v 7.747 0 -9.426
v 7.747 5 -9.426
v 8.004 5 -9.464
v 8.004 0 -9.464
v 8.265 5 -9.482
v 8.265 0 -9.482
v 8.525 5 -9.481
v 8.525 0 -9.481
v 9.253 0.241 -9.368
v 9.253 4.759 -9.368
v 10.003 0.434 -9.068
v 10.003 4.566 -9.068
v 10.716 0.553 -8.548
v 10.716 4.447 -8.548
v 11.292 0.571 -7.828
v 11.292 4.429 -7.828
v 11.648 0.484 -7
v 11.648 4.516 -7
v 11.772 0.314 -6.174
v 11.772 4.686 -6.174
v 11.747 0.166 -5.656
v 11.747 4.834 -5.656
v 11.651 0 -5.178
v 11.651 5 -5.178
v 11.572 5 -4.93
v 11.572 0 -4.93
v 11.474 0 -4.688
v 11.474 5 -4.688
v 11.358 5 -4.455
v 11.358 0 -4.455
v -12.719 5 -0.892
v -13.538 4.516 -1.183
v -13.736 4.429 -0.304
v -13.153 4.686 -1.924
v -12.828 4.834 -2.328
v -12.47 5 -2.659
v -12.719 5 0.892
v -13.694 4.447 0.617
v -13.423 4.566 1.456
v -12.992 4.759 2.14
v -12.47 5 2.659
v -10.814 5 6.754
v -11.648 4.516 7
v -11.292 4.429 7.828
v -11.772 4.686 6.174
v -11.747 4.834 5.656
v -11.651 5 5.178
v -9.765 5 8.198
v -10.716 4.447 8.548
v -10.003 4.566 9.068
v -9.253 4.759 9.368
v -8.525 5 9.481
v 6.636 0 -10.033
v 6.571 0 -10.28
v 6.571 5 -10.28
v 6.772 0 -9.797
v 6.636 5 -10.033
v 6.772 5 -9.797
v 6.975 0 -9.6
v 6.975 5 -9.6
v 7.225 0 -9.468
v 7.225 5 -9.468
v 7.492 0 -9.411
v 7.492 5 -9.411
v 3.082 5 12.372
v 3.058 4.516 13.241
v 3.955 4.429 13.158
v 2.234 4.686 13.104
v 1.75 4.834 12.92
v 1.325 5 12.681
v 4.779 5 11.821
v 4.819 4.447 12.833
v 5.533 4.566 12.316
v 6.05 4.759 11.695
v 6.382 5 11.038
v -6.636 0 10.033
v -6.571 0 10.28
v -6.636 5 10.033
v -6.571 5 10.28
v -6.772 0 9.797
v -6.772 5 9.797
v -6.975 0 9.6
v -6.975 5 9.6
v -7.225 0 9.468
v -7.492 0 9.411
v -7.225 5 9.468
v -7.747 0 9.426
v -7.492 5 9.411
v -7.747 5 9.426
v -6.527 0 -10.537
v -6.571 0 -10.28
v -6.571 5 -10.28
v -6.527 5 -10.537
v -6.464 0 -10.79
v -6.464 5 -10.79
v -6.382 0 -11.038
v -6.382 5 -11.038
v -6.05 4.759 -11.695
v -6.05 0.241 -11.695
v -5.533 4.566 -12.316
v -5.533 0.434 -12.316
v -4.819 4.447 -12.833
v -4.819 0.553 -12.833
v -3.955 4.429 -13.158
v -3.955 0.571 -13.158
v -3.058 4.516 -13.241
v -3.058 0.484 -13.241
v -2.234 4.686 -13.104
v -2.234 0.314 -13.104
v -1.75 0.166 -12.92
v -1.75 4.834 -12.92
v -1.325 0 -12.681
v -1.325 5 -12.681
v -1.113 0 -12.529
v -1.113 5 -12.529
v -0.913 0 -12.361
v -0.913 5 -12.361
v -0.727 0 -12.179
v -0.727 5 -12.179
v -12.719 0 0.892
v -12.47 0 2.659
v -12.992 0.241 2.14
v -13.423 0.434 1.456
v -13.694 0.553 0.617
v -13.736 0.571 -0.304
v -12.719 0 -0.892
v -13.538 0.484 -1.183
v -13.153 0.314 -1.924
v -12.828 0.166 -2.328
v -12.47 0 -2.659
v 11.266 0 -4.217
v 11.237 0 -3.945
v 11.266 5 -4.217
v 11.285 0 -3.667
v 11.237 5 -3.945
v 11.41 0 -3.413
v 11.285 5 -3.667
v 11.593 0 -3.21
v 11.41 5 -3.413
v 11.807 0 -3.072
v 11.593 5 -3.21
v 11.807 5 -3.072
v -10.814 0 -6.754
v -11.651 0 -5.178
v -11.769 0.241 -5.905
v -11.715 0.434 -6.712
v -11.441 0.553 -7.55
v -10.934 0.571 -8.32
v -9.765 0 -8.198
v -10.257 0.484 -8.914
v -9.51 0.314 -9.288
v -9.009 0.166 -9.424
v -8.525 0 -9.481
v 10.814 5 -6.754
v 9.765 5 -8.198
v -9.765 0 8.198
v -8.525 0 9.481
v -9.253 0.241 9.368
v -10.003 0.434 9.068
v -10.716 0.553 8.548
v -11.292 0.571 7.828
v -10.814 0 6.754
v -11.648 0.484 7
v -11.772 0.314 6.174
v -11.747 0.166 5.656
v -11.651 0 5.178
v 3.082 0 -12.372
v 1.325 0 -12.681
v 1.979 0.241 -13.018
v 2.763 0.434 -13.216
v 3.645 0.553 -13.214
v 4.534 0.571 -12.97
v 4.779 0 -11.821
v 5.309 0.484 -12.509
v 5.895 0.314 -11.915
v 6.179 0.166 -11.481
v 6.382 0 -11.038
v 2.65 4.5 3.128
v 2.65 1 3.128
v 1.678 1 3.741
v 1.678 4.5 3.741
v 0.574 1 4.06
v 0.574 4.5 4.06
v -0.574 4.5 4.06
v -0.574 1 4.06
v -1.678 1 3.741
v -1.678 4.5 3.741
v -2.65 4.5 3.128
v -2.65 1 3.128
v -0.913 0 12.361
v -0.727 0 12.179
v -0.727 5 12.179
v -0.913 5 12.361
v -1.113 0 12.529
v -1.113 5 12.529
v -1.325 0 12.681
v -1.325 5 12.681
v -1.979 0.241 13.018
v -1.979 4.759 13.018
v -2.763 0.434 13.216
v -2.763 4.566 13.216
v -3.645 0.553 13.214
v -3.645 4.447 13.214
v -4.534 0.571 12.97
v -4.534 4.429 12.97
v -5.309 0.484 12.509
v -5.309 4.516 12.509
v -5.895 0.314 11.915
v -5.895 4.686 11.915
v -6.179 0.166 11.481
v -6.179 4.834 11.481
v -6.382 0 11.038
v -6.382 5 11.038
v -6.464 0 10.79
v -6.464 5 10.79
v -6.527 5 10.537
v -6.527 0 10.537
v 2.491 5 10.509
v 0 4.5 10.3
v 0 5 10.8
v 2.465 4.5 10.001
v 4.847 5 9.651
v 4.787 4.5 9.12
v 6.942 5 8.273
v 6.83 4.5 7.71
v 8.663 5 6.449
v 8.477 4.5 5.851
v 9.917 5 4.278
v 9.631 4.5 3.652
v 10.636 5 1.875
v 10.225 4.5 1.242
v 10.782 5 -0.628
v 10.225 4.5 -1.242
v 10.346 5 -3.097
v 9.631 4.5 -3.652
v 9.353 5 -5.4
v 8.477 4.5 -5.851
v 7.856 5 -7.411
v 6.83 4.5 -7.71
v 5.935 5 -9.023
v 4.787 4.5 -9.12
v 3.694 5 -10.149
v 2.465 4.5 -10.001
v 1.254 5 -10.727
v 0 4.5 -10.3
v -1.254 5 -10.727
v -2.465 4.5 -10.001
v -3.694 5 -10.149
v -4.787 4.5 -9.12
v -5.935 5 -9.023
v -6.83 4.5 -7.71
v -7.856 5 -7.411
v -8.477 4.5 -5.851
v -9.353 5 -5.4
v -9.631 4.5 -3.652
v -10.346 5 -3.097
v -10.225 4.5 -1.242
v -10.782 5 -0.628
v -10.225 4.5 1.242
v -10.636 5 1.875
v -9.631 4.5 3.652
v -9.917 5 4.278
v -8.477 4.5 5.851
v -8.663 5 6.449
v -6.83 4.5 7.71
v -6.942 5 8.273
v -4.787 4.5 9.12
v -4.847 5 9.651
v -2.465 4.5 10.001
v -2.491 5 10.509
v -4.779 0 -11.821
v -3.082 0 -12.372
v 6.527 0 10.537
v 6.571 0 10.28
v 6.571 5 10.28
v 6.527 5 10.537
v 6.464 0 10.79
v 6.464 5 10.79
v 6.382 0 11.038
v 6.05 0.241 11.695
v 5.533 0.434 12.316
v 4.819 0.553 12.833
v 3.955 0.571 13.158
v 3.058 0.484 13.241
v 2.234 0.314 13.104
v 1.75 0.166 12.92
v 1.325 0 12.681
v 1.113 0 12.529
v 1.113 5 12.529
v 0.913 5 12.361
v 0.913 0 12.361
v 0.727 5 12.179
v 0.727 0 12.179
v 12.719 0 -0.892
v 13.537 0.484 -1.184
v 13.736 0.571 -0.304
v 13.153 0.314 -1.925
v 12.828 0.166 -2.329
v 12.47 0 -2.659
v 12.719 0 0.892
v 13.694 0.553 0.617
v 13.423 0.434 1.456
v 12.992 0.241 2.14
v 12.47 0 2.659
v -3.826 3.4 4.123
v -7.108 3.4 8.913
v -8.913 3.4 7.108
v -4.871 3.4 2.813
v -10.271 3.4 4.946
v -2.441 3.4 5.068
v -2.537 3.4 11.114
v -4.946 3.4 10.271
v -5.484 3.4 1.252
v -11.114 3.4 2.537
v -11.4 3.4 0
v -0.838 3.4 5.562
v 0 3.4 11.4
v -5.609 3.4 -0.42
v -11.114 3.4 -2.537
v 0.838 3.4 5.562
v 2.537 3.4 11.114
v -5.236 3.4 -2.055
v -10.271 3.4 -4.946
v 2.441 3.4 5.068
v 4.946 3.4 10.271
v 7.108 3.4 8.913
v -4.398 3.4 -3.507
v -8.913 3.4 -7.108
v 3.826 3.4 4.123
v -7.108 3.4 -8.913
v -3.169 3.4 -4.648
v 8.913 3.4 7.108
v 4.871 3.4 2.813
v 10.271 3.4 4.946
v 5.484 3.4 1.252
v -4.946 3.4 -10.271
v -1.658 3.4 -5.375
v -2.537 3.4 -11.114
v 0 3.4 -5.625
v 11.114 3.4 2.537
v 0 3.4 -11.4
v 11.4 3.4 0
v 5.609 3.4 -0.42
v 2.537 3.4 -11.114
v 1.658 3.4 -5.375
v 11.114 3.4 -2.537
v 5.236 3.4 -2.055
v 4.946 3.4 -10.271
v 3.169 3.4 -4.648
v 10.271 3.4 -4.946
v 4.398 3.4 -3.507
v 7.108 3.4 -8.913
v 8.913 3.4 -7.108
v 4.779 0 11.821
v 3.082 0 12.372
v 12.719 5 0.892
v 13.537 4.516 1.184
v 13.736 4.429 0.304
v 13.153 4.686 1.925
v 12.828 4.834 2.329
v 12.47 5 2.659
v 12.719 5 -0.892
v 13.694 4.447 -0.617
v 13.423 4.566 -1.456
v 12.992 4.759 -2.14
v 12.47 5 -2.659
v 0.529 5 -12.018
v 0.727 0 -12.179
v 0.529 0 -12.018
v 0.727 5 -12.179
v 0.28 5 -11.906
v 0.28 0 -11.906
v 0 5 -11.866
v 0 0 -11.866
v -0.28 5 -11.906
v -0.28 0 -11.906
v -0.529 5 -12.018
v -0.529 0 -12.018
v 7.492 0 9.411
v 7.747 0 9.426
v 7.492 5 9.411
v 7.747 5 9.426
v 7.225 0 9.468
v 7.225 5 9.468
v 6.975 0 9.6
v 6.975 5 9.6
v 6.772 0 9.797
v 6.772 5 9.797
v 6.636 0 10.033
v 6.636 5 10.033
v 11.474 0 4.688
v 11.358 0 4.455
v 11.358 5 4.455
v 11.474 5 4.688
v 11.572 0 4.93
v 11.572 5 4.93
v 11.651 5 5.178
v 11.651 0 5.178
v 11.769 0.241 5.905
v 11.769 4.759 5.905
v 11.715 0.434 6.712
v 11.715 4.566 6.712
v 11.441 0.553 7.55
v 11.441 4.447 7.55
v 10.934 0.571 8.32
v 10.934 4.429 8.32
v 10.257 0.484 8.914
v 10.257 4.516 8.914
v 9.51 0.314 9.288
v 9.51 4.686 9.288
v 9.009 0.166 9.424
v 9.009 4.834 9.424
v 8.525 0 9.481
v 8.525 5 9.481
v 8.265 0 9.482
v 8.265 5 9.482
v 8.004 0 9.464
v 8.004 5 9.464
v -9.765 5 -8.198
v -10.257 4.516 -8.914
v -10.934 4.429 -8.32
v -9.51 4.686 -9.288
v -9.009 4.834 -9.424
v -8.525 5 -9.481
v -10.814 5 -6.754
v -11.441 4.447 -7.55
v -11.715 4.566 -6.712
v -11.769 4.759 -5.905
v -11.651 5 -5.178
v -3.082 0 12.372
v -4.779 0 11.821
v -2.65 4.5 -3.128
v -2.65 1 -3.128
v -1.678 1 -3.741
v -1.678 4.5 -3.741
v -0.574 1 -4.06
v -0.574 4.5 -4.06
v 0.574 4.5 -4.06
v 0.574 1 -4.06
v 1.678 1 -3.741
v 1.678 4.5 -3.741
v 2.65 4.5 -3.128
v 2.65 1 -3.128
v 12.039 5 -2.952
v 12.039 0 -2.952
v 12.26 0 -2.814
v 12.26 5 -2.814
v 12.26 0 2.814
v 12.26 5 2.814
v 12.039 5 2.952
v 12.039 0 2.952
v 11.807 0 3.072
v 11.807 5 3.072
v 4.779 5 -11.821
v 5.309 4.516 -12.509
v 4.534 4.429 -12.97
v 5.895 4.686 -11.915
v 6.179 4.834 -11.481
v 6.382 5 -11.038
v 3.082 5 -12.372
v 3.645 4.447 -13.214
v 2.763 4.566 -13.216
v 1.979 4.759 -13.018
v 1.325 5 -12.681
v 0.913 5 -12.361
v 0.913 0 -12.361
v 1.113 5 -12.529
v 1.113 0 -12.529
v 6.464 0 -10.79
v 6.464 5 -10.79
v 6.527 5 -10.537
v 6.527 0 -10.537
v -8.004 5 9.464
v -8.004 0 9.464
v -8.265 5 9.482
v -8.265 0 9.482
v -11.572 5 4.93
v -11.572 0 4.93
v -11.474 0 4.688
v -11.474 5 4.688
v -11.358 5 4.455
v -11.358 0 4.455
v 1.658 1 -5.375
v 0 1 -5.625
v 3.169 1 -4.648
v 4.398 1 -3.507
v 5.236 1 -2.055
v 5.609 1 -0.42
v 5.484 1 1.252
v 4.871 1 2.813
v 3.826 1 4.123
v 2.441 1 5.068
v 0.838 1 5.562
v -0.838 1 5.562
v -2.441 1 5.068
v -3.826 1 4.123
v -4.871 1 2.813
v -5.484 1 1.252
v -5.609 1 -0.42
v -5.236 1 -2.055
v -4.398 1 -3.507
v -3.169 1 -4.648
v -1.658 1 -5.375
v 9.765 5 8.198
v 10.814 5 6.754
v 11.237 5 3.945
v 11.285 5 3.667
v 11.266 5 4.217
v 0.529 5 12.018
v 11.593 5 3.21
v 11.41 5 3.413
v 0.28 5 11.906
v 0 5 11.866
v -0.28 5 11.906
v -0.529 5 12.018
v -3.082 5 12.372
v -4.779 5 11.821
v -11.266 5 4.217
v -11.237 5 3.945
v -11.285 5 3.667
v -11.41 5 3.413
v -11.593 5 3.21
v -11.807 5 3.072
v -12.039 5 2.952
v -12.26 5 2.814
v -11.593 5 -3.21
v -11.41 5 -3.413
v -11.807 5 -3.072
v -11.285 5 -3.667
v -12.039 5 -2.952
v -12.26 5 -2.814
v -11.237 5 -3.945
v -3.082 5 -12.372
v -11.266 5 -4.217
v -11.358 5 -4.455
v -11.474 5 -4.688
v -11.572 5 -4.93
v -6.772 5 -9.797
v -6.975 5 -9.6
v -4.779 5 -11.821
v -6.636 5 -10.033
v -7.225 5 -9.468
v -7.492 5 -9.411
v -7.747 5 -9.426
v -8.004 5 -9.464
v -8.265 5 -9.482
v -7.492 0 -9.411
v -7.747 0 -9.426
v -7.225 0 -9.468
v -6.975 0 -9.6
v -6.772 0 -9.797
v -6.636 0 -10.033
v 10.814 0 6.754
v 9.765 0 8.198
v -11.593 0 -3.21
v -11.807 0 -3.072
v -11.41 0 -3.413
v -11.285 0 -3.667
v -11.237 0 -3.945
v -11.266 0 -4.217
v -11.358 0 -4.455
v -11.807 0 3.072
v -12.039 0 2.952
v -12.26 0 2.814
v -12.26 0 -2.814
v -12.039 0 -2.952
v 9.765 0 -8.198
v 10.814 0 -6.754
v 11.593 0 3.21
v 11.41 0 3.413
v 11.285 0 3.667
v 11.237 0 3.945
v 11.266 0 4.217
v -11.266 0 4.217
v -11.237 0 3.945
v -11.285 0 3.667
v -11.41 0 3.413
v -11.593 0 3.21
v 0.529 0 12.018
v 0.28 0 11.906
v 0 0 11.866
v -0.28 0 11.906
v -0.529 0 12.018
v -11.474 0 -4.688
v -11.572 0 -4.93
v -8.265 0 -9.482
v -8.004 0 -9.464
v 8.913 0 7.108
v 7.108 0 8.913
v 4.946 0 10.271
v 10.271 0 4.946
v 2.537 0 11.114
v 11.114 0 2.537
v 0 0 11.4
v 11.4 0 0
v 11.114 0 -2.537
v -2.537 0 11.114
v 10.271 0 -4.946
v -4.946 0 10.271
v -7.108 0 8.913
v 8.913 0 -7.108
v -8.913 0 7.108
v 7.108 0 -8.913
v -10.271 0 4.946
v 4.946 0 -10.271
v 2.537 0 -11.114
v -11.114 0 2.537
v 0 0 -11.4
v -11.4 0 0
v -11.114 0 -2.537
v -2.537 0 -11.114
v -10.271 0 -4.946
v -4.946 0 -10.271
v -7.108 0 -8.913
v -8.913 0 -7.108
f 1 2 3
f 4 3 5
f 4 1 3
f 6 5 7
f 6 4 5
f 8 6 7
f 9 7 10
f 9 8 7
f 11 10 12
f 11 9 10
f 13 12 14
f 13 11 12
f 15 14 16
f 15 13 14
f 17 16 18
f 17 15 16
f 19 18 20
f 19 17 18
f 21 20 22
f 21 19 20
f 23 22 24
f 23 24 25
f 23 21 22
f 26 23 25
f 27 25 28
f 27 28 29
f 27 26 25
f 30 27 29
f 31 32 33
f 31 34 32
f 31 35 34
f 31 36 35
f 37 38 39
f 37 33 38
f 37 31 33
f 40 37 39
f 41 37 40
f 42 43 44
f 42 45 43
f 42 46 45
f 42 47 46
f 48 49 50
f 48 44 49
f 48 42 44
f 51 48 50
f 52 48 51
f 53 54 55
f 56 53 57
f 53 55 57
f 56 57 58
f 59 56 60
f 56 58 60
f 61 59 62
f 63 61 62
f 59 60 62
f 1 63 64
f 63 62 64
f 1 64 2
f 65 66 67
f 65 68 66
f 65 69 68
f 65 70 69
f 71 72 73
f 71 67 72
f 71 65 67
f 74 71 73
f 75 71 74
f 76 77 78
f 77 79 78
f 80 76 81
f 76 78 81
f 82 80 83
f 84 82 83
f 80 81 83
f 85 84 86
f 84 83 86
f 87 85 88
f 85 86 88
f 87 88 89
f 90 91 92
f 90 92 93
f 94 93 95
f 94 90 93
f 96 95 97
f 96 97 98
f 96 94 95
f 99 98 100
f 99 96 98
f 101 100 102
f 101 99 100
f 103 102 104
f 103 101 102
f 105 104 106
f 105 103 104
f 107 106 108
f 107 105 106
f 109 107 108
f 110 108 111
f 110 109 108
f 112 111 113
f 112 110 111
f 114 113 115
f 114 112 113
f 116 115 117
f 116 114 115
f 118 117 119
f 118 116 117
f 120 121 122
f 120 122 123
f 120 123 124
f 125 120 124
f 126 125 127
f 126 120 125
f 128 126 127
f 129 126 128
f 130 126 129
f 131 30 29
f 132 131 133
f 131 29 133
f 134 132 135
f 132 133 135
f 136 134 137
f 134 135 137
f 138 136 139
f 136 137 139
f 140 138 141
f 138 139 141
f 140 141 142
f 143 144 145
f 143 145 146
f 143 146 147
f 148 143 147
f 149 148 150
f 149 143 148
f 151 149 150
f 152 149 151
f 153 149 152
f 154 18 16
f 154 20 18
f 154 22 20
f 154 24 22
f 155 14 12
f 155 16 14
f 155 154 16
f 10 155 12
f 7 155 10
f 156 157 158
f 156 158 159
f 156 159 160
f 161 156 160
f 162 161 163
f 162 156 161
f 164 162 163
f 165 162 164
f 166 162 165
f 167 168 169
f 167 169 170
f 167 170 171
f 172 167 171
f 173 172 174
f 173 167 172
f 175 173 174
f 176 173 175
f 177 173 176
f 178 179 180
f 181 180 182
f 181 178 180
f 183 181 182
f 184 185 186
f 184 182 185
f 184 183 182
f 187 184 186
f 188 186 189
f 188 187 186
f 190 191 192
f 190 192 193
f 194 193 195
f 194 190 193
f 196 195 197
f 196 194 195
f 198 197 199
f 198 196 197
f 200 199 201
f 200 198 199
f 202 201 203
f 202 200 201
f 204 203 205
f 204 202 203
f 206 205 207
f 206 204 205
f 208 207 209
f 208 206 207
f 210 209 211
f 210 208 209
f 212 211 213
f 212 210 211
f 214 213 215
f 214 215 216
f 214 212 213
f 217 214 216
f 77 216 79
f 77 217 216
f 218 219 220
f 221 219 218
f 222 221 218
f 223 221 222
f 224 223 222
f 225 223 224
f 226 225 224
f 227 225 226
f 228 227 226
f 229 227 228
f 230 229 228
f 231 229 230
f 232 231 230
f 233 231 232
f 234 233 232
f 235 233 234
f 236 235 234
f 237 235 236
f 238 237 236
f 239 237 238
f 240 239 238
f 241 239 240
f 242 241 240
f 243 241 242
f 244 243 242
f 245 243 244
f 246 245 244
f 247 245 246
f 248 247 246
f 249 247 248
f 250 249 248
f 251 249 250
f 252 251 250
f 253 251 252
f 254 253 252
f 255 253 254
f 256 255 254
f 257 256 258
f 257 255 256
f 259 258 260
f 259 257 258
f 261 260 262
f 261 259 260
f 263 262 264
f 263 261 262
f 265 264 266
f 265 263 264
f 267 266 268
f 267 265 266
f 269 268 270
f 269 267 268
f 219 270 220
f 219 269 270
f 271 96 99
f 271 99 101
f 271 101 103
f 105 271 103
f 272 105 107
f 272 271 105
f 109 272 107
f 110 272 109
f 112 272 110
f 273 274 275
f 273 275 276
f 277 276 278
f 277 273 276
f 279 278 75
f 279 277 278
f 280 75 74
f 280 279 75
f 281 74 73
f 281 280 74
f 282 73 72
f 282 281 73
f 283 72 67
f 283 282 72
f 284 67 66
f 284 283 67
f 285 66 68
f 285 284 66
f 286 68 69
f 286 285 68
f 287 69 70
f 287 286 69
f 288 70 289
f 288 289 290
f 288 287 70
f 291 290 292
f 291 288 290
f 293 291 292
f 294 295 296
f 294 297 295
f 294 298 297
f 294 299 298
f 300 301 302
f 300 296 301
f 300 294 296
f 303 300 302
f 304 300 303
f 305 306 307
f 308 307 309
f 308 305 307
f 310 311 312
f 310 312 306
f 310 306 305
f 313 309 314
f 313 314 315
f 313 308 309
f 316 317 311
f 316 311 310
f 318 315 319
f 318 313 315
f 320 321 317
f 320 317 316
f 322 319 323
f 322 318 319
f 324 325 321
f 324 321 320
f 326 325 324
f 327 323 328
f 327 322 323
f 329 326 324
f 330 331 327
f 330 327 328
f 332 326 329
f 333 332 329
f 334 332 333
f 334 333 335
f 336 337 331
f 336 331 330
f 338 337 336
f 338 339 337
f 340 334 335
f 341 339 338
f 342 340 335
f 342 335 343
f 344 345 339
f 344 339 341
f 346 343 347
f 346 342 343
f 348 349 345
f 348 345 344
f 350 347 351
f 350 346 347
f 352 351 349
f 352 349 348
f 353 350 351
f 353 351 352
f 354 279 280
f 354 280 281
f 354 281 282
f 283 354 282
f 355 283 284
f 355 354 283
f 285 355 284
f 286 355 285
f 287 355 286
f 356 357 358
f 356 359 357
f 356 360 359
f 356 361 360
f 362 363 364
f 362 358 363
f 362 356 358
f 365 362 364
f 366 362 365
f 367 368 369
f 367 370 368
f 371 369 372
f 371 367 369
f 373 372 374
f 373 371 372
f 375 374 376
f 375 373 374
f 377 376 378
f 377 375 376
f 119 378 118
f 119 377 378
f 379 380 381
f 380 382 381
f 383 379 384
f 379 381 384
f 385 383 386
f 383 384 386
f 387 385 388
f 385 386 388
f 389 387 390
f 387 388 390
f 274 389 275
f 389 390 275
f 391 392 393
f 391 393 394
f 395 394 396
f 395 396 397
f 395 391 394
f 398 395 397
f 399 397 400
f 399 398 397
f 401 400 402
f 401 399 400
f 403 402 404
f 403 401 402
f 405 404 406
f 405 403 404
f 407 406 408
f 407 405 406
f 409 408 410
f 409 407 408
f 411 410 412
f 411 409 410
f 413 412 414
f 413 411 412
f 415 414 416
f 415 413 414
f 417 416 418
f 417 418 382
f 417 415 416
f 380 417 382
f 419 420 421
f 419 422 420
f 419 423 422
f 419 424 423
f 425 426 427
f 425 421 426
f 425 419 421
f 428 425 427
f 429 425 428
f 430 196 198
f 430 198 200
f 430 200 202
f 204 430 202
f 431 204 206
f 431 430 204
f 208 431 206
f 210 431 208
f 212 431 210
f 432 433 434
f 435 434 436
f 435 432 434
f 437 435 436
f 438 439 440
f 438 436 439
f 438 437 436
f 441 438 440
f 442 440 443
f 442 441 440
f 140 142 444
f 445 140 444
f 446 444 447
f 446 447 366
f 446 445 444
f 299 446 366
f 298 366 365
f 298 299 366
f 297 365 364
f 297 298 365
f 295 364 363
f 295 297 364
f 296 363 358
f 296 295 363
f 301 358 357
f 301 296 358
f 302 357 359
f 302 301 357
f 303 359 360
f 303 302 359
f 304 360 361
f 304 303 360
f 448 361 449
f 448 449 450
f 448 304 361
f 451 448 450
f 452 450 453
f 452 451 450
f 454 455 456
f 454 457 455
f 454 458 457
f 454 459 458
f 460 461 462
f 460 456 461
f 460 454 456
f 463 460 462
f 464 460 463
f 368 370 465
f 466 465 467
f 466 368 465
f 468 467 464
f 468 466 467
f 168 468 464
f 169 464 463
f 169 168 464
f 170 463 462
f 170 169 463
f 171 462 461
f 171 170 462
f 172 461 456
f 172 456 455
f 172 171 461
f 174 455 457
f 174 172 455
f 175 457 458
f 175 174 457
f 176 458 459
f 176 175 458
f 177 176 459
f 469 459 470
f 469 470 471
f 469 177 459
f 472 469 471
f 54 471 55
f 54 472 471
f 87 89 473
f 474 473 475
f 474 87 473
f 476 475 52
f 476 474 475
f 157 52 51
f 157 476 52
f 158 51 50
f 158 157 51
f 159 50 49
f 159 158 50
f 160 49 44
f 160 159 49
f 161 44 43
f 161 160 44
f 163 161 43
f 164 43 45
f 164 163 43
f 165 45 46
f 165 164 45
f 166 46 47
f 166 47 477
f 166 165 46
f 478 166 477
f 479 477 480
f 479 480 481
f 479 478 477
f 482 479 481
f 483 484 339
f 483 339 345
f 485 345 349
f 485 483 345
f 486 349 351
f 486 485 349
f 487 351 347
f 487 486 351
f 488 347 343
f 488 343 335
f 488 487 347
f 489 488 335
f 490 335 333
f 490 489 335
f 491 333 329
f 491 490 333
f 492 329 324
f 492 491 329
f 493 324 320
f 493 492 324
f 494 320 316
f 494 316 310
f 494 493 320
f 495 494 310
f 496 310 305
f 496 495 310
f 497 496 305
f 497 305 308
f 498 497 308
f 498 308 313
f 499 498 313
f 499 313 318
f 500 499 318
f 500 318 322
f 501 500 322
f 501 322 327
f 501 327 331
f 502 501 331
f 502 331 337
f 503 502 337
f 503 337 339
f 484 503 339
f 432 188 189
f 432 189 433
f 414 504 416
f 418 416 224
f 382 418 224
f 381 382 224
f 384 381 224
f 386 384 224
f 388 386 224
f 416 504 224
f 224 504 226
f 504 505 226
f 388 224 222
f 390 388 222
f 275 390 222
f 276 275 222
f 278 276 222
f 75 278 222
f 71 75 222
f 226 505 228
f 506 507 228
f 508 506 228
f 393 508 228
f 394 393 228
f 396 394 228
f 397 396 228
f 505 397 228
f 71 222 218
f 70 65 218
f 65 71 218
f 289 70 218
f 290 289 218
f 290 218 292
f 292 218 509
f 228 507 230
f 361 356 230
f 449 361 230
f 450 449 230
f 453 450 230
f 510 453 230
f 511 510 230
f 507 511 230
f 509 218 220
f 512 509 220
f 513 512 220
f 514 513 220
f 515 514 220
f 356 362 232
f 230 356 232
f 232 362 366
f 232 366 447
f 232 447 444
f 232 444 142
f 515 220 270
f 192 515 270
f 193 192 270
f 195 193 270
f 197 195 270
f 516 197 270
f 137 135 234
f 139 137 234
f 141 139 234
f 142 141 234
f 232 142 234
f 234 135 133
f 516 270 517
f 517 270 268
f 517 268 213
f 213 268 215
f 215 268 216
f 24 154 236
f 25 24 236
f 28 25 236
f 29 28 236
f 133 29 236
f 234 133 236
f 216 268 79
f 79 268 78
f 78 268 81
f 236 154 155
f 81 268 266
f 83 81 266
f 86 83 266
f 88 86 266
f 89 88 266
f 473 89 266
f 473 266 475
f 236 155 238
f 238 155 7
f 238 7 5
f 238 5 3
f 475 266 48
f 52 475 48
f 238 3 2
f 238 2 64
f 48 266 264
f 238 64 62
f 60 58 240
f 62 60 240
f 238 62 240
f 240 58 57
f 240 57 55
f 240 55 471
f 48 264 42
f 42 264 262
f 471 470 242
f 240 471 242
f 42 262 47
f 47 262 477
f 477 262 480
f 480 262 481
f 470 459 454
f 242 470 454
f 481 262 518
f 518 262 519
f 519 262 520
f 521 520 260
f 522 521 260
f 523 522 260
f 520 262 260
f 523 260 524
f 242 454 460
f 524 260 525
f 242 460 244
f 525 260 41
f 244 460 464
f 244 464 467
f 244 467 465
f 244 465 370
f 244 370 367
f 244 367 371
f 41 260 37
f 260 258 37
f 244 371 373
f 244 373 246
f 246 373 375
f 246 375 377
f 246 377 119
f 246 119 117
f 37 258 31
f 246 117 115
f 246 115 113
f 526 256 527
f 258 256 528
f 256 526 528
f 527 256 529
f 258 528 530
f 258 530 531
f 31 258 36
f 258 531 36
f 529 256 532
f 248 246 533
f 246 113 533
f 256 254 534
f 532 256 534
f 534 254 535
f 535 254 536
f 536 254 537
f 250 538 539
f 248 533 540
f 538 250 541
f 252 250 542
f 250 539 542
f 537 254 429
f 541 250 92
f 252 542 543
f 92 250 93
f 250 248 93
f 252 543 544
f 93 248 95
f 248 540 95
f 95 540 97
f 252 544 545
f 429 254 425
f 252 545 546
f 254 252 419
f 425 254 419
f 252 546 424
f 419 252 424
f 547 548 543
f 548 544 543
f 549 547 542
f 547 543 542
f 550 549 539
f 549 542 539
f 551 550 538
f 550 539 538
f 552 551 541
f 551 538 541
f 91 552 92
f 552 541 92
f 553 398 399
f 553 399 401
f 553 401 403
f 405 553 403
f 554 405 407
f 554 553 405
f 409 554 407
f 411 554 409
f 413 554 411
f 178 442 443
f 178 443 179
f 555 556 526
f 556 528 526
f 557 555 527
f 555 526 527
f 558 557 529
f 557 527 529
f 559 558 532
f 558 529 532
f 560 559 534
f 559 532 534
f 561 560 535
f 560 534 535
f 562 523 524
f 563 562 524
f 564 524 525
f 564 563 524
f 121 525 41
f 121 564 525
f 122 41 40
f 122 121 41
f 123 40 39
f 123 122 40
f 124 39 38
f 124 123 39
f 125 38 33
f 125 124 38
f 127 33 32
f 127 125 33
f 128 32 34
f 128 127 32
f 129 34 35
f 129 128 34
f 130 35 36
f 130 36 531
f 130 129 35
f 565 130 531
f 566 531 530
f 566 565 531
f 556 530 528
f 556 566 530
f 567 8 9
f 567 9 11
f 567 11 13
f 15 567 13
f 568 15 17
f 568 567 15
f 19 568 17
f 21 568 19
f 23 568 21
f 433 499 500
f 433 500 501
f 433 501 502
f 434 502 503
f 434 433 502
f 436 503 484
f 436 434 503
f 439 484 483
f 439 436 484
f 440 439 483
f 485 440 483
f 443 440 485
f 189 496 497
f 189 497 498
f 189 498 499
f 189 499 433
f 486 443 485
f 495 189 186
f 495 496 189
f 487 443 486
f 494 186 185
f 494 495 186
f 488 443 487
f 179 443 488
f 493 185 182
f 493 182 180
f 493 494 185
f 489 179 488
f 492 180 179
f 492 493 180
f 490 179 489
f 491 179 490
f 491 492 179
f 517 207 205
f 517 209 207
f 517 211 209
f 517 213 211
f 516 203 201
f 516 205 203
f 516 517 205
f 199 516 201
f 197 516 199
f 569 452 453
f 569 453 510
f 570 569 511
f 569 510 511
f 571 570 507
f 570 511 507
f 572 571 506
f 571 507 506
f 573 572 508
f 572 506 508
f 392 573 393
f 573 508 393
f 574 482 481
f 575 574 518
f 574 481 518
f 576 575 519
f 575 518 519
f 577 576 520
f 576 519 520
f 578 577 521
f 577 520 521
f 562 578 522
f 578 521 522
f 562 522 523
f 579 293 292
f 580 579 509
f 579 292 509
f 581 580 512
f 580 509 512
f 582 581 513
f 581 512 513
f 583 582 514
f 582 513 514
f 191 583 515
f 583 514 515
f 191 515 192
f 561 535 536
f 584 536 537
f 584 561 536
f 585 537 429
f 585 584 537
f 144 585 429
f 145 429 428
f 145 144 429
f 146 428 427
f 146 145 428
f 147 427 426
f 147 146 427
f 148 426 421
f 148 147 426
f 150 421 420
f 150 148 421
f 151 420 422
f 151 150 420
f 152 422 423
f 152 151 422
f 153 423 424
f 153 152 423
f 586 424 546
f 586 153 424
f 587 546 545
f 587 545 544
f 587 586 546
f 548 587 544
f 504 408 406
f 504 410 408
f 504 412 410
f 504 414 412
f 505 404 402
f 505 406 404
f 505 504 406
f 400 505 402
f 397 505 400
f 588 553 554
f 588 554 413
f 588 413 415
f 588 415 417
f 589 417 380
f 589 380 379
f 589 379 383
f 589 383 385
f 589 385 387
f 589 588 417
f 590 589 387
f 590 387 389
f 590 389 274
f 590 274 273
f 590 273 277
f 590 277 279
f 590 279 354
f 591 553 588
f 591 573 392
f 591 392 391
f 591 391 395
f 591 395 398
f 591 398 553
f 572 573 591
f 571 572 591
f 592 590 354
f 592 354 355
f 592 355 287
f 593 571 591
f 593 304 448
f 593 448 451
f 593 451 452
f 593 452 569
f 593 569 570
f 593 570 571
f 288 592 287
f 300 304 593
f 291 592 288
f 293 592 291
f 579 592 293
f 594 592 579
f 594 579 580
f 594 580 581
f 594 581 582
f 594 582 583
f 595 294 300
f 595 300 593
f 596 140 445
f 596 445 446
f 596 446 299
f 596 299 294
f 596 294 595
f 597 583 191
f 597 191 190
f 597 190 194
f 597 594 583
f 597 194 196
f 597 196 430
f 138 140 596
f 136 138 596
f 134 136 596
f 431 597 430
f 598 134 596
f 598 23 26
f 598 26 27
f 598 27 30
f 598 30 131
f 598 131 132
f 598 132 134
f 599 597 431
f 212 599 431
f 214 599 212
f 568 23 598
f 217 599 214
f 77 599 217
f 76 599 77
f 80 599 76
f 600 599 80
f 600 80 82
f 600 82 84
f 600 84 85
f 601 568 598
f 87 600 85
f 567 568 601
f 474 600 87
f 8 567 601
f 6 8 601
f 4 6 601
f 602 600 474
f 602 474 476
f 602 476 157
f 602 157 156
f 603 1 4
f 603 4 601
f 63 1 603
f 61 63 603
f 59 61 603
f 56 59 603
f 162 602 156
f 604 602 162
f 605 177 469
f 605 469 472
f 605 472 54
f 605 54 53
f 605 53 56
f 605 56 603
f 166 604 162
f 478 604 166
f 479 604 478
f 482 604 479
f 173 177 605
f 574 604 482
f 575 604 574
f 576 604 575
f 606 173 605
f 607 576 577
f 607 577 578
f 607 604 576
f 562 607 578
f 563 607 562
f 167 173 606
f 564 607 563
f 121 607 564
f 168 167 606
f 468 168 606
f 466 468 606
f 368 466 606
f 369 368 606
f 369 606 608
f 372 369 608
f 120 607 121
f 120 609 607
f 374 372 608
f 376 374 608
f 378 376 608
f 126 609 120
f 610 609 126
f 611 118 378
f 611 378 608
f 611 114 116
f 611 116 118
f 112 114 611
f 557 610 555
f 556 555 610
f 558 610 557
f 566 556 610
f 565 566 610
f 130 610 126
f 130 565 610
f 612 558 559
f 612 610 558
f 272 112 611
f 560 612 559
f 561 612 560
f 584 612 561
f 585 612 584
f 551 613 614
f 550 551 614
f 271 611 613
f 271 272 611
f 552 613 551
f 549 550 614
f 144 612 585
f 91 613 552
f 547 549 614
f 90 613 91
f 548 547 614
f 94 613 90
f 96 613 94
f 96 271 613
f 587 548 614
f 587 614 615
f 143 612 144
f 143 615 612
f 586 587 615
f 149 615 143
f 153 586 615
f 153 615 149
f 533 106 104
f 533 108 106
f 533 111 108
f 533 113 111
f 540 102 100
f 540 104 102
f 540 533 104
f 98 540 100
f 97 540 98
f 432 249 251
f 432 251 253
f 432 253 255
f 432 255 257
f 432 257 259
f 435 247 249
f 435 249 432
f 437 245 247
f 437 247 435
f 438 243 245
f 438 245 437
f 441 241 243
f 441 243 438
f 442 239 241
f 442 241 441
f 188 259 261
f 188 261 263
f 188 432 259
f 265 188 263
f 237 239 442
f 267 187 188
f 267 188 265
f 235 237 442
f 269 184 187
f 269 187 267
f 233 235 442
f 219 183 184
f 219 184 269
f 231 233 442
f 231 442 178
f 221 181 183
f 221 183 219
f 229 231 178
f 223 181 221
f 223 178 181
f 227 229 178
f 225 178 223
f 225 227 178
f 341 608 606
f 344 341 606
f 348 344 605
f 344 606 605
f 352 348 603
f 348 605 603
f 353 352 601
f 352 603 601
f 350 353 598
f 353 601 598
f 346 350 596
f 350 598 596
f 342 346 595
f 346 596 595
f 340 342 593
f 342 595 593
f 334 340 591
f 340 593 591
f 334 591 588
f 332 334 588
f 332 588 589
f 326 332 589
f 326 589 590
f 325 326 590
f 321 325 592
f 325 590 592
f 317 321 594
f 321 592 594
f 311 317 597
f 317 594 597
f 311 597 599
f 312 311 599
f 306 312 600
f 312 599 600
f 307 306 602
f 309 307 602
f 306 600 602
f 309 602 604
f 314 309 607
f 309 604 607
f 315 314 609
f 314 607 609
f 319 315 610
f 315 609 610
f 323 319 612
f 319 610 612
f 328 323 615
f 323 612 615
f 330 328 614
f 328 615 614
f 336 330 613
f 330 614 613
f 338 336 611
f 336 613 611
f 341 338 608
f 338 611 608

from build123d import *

# Parameters (mm, degrees)
BOSS_EXTRUDE1_DEPTH = 5
FILLET2_R           = 1
SKETCH5_R           = 10.3
CUT_EXTRUDE1_DEPTH  = 0.5
CHAMFER1_SIZE       = 0.5
SKETCH6_OUTSIDE_W   = 384.304
SKETCH6_OUTSIDE_H   = 383.29
SKETCH6_OUTSIDE_R   = 12.75
CUT_EXTRUDE2_DEPTH  = 100.2
CUT_EXTRUDE2_DRAFT  = -60
SKETCH7_OUTSIDE_W   = 177.498
SKETCH7_OUTSIDE_H   = 176.484
SKETCH7_OUTSIDE_R   = 12.75
CUT_EXTRUDE3_DEPTH  = 40.5
CUT_EXTRUDE3_DRAFT  = -60
CUT_EXTRUDE4_DEPTH  = 40.5
SKETCH9_R           = 11.4
SKETCH9_R_2         = 5.625
CUT_EXTRUDE5_DEPTH  = 3.4
SKETCH10_R          = 6
CUT_EXTRUDE6_DEPTH  = 1


with BuildPart() as part:
    # Sketch1 → Boss-Extrude1 (new body)
    with BuildSketch(Plane(origin=(0, 0, 0), x_dir=(1, 0, 0), z_dir=(0, 1, 0))):
        with BuildLine():
            ThreePointArc((0, 11), (4.248983673, 13.077027099), (6.465637775, 8.899186938))
            ThreePointArc((6.465637775, 8.899186938), (11.123983673, 8.082047219), (10.461621679, 3.399186938))
            ThreePointArc((10.461621679, 3.399186938), (13.75, 0), (10.461621679, -3.399186938))
            ThreePointArc((10.461621679, -3.399186938), (11.123983673, -8.082047219), (6.465637775, -8.899186938))
            ThreePointArc((6.465637775, -8.899186938), (4.248983673, -13.077027099), (0, -11))
            ThreePointArc((0, -11), (-4.248983673, -13.077027099), (-6.465637775, -8.899186938))
            ThreePointArc((-6.465637775, -8.899186938), (-11.123983673, -8.082047219), (-10.461621679, -3.399186938))
            ThreePointArc((-10.461621679, -3.399186938), (-13.75, 0), (-10.461621679, 3.399186938))
            ThreePointArc((-10.461621679, 3.399186938), (-11.123983673, 8.082047219), (-6.465637775, 8.899186938))
            ThreePointArc((-6.465637775, 8.899186938), (-4.248983673, 13.077027099), (0, 11))
        make_face()
    extrude(amount=BOSS_EXTRUDE1_DEPTH)

    # Fillet2
    fillet2_edges = [part.edges().sort_by_distance(p)[0] for p in [
        (10.461621679, 2.5, -3.399186938),
        (10.461621679, 2.5, 3.399186938),
        (6.465637775, 2.5, 8.899186938),
        (0, 2.5, 11),
        (-6.465637775, 2.5, 8.899186938),
        (-10.461621679, 2.5, 3.399186938),
        (-10.461621679, 2.5, -3.399186938),
        (-6.465637775, 2.5, -8.899186938),
        (0, 2.5, -11),
        (6.465637775, 2.5, -8.899186938),
    ]]
    fillet(fillet2_edges, radius=FILLET2_R)

    # Sketch5 → Cut-Extrude1 (cut)
    with BuildSketch(Plane(origin=(0, 5, 0), x_dir=(1, 0, 0), z_dir=(0, 1, 0))):
        with Locations(Location((0, 0, 0), (0, 0, 270))):
            Circle(SKETCH5_R)
    extrude(amount=-CUT_EXTRUDE1_DEPTH, mode=Mode.SUBTRACT)

    # Chamfer1
    chamfer1_edges = [part.edges().sort_by_distance(p)[0] for p in [
        (0, 5, -10.3),
    ]]
    chamfer(chamfer1_edges, length=CHAMFER1_SIZE - 0.0001)  # a hair under: the kernel refuses the full size


with BuildPart() as cut_extrude2_tool:
    # Sketch6 outside → Cut-Extrude2 (with draft: the straight prism first)
    with BuildSketch(Plane(origin=(0, 5, 0), x_dir=(1, 0, 0), z_dir=(0, 1, 0))):
        Rectangle(SKETCH6_OUTSIDE_W, SKETCH6_OUTSIDE_H)
        Circle(SKETCH6_OUTSIDE_R, mode=Mode.SUBTRACT)
    extrude(amount=-CUT_EXTRUDE2_DEPTH)
    # Cut-Extrude2: the draft: its side faces are tilted about the plane it starts from
    cut_extrude2_sides = [cut_extrude2_tool.faces().sort_by_distance(p)[0] for p in [
        (0, -45.1, 191.645),
        (192.152, -45.1, 0),
        (0, -45.1, -191.645),
        (-192.152, -45.1, 0),
        (-12.75, -45.1, 0),
    ]]
    draft(cut_extrude2_sides, Plane(origin=(0, 5, 0), x_dir=(1, 0, 0), z_dir=(0, 1, 0)), CUT_EXTRUDE2_DRAFT)


with BuildPart() as part_1:
    add(part.part)

    # Cut-Extrude2: cut by cut_extrude2_tool
    add(cut_extrude2_tool.part, mode=Mode.SUBTRACT)


with BuildPart() as cut_extrude3_tool:
    # Sketch7 outside → Cut-Extrude3 (with draft: the straight prism first)
    with BuildSketch(Plane.XZ):
        Rectangle(SKETCH7_OUTSIDE_W, SKETCH7_OUTSIDE_H)
        Circle(SKETCH7_OUTSIDE_R, mode=Mode.SUBTRACT)
    extrude(amount=-CUT_EXTRUDE3_DEPTH)
    # Cut-Extrude3: the draft: its side faces are tilted about the plane it starts from
    cut_extrude3_sides = [cut_extrude3_tool.faces().sort_by_distance(p)[0] for p in [
        (0, 20.25, -88.242),
        (88.749, 20.25, 0),
        (0, 20.25, 88.242),
        (-88.749, 20.25, 0),
        (-12.75, 20.25, 0),
    ]]
    draft(cut_extrude3_sides, Plane.XZ, CUT_EXTRUDE3_DRAFT)


with BuildPart() as part_2:
    add(part_1.part)

    # Cut-Extrude3: cut by cut_extrude3_tool
    add(cut_extrude3_tool.part, mode=Mode.SUBTRACT)

    # Sketch8 → Cut-Extrude4 (cut)
    with BuildSketch(Plane(origin=(0, 4.5, 0), x_dir=(1, 0, 0), z_dir=(0, 1, 0))):
        with BuildLine():
            Line((-2.65, -3.128498042), (-2.65, 3.128498042))
            ThreePointArc((-2.65, 3.128498042), (0, 4.1), (2.65, 3.128498042))
            Line((2.65, 3.128498042), (2.65, -3.128498042))
            ThreePointArc((2.65, -3.128498042), (0, -4.1), (-2.65, -3.128498042))
        make_face()
    extrude(amount=-CUT_EXTRUDE4_DEPTH, mode=Mode.SUBTRACT)

    # Sketch9 → Cut-Extrude5 (cut)
    with BuildSketch(Plane.XZ):
        with Locations(Location((0, 0, 0), (0, 0, 270))):
            Circle(SKETCH9_R)
        with Locations(Location((0, 0, 0), (0, 0, 270))):
            Circle(SKETCH9_R_2, mode=Mode.SUBTRACT)
    extrude(amount=-CUT_EXTRUDE5_DEPTH, mode=Mode.SUBTRACT)

    # Sketch10 → Cut-Extrude6 (cut)
    with BuildSketch(Plane.XZ):
        Circle(SKETCH10_R)
    extrude(amount=-CUT_EXTRUDE6_DEPTH, mode=Mode.SUBTRACT)


solid = part_2.part
